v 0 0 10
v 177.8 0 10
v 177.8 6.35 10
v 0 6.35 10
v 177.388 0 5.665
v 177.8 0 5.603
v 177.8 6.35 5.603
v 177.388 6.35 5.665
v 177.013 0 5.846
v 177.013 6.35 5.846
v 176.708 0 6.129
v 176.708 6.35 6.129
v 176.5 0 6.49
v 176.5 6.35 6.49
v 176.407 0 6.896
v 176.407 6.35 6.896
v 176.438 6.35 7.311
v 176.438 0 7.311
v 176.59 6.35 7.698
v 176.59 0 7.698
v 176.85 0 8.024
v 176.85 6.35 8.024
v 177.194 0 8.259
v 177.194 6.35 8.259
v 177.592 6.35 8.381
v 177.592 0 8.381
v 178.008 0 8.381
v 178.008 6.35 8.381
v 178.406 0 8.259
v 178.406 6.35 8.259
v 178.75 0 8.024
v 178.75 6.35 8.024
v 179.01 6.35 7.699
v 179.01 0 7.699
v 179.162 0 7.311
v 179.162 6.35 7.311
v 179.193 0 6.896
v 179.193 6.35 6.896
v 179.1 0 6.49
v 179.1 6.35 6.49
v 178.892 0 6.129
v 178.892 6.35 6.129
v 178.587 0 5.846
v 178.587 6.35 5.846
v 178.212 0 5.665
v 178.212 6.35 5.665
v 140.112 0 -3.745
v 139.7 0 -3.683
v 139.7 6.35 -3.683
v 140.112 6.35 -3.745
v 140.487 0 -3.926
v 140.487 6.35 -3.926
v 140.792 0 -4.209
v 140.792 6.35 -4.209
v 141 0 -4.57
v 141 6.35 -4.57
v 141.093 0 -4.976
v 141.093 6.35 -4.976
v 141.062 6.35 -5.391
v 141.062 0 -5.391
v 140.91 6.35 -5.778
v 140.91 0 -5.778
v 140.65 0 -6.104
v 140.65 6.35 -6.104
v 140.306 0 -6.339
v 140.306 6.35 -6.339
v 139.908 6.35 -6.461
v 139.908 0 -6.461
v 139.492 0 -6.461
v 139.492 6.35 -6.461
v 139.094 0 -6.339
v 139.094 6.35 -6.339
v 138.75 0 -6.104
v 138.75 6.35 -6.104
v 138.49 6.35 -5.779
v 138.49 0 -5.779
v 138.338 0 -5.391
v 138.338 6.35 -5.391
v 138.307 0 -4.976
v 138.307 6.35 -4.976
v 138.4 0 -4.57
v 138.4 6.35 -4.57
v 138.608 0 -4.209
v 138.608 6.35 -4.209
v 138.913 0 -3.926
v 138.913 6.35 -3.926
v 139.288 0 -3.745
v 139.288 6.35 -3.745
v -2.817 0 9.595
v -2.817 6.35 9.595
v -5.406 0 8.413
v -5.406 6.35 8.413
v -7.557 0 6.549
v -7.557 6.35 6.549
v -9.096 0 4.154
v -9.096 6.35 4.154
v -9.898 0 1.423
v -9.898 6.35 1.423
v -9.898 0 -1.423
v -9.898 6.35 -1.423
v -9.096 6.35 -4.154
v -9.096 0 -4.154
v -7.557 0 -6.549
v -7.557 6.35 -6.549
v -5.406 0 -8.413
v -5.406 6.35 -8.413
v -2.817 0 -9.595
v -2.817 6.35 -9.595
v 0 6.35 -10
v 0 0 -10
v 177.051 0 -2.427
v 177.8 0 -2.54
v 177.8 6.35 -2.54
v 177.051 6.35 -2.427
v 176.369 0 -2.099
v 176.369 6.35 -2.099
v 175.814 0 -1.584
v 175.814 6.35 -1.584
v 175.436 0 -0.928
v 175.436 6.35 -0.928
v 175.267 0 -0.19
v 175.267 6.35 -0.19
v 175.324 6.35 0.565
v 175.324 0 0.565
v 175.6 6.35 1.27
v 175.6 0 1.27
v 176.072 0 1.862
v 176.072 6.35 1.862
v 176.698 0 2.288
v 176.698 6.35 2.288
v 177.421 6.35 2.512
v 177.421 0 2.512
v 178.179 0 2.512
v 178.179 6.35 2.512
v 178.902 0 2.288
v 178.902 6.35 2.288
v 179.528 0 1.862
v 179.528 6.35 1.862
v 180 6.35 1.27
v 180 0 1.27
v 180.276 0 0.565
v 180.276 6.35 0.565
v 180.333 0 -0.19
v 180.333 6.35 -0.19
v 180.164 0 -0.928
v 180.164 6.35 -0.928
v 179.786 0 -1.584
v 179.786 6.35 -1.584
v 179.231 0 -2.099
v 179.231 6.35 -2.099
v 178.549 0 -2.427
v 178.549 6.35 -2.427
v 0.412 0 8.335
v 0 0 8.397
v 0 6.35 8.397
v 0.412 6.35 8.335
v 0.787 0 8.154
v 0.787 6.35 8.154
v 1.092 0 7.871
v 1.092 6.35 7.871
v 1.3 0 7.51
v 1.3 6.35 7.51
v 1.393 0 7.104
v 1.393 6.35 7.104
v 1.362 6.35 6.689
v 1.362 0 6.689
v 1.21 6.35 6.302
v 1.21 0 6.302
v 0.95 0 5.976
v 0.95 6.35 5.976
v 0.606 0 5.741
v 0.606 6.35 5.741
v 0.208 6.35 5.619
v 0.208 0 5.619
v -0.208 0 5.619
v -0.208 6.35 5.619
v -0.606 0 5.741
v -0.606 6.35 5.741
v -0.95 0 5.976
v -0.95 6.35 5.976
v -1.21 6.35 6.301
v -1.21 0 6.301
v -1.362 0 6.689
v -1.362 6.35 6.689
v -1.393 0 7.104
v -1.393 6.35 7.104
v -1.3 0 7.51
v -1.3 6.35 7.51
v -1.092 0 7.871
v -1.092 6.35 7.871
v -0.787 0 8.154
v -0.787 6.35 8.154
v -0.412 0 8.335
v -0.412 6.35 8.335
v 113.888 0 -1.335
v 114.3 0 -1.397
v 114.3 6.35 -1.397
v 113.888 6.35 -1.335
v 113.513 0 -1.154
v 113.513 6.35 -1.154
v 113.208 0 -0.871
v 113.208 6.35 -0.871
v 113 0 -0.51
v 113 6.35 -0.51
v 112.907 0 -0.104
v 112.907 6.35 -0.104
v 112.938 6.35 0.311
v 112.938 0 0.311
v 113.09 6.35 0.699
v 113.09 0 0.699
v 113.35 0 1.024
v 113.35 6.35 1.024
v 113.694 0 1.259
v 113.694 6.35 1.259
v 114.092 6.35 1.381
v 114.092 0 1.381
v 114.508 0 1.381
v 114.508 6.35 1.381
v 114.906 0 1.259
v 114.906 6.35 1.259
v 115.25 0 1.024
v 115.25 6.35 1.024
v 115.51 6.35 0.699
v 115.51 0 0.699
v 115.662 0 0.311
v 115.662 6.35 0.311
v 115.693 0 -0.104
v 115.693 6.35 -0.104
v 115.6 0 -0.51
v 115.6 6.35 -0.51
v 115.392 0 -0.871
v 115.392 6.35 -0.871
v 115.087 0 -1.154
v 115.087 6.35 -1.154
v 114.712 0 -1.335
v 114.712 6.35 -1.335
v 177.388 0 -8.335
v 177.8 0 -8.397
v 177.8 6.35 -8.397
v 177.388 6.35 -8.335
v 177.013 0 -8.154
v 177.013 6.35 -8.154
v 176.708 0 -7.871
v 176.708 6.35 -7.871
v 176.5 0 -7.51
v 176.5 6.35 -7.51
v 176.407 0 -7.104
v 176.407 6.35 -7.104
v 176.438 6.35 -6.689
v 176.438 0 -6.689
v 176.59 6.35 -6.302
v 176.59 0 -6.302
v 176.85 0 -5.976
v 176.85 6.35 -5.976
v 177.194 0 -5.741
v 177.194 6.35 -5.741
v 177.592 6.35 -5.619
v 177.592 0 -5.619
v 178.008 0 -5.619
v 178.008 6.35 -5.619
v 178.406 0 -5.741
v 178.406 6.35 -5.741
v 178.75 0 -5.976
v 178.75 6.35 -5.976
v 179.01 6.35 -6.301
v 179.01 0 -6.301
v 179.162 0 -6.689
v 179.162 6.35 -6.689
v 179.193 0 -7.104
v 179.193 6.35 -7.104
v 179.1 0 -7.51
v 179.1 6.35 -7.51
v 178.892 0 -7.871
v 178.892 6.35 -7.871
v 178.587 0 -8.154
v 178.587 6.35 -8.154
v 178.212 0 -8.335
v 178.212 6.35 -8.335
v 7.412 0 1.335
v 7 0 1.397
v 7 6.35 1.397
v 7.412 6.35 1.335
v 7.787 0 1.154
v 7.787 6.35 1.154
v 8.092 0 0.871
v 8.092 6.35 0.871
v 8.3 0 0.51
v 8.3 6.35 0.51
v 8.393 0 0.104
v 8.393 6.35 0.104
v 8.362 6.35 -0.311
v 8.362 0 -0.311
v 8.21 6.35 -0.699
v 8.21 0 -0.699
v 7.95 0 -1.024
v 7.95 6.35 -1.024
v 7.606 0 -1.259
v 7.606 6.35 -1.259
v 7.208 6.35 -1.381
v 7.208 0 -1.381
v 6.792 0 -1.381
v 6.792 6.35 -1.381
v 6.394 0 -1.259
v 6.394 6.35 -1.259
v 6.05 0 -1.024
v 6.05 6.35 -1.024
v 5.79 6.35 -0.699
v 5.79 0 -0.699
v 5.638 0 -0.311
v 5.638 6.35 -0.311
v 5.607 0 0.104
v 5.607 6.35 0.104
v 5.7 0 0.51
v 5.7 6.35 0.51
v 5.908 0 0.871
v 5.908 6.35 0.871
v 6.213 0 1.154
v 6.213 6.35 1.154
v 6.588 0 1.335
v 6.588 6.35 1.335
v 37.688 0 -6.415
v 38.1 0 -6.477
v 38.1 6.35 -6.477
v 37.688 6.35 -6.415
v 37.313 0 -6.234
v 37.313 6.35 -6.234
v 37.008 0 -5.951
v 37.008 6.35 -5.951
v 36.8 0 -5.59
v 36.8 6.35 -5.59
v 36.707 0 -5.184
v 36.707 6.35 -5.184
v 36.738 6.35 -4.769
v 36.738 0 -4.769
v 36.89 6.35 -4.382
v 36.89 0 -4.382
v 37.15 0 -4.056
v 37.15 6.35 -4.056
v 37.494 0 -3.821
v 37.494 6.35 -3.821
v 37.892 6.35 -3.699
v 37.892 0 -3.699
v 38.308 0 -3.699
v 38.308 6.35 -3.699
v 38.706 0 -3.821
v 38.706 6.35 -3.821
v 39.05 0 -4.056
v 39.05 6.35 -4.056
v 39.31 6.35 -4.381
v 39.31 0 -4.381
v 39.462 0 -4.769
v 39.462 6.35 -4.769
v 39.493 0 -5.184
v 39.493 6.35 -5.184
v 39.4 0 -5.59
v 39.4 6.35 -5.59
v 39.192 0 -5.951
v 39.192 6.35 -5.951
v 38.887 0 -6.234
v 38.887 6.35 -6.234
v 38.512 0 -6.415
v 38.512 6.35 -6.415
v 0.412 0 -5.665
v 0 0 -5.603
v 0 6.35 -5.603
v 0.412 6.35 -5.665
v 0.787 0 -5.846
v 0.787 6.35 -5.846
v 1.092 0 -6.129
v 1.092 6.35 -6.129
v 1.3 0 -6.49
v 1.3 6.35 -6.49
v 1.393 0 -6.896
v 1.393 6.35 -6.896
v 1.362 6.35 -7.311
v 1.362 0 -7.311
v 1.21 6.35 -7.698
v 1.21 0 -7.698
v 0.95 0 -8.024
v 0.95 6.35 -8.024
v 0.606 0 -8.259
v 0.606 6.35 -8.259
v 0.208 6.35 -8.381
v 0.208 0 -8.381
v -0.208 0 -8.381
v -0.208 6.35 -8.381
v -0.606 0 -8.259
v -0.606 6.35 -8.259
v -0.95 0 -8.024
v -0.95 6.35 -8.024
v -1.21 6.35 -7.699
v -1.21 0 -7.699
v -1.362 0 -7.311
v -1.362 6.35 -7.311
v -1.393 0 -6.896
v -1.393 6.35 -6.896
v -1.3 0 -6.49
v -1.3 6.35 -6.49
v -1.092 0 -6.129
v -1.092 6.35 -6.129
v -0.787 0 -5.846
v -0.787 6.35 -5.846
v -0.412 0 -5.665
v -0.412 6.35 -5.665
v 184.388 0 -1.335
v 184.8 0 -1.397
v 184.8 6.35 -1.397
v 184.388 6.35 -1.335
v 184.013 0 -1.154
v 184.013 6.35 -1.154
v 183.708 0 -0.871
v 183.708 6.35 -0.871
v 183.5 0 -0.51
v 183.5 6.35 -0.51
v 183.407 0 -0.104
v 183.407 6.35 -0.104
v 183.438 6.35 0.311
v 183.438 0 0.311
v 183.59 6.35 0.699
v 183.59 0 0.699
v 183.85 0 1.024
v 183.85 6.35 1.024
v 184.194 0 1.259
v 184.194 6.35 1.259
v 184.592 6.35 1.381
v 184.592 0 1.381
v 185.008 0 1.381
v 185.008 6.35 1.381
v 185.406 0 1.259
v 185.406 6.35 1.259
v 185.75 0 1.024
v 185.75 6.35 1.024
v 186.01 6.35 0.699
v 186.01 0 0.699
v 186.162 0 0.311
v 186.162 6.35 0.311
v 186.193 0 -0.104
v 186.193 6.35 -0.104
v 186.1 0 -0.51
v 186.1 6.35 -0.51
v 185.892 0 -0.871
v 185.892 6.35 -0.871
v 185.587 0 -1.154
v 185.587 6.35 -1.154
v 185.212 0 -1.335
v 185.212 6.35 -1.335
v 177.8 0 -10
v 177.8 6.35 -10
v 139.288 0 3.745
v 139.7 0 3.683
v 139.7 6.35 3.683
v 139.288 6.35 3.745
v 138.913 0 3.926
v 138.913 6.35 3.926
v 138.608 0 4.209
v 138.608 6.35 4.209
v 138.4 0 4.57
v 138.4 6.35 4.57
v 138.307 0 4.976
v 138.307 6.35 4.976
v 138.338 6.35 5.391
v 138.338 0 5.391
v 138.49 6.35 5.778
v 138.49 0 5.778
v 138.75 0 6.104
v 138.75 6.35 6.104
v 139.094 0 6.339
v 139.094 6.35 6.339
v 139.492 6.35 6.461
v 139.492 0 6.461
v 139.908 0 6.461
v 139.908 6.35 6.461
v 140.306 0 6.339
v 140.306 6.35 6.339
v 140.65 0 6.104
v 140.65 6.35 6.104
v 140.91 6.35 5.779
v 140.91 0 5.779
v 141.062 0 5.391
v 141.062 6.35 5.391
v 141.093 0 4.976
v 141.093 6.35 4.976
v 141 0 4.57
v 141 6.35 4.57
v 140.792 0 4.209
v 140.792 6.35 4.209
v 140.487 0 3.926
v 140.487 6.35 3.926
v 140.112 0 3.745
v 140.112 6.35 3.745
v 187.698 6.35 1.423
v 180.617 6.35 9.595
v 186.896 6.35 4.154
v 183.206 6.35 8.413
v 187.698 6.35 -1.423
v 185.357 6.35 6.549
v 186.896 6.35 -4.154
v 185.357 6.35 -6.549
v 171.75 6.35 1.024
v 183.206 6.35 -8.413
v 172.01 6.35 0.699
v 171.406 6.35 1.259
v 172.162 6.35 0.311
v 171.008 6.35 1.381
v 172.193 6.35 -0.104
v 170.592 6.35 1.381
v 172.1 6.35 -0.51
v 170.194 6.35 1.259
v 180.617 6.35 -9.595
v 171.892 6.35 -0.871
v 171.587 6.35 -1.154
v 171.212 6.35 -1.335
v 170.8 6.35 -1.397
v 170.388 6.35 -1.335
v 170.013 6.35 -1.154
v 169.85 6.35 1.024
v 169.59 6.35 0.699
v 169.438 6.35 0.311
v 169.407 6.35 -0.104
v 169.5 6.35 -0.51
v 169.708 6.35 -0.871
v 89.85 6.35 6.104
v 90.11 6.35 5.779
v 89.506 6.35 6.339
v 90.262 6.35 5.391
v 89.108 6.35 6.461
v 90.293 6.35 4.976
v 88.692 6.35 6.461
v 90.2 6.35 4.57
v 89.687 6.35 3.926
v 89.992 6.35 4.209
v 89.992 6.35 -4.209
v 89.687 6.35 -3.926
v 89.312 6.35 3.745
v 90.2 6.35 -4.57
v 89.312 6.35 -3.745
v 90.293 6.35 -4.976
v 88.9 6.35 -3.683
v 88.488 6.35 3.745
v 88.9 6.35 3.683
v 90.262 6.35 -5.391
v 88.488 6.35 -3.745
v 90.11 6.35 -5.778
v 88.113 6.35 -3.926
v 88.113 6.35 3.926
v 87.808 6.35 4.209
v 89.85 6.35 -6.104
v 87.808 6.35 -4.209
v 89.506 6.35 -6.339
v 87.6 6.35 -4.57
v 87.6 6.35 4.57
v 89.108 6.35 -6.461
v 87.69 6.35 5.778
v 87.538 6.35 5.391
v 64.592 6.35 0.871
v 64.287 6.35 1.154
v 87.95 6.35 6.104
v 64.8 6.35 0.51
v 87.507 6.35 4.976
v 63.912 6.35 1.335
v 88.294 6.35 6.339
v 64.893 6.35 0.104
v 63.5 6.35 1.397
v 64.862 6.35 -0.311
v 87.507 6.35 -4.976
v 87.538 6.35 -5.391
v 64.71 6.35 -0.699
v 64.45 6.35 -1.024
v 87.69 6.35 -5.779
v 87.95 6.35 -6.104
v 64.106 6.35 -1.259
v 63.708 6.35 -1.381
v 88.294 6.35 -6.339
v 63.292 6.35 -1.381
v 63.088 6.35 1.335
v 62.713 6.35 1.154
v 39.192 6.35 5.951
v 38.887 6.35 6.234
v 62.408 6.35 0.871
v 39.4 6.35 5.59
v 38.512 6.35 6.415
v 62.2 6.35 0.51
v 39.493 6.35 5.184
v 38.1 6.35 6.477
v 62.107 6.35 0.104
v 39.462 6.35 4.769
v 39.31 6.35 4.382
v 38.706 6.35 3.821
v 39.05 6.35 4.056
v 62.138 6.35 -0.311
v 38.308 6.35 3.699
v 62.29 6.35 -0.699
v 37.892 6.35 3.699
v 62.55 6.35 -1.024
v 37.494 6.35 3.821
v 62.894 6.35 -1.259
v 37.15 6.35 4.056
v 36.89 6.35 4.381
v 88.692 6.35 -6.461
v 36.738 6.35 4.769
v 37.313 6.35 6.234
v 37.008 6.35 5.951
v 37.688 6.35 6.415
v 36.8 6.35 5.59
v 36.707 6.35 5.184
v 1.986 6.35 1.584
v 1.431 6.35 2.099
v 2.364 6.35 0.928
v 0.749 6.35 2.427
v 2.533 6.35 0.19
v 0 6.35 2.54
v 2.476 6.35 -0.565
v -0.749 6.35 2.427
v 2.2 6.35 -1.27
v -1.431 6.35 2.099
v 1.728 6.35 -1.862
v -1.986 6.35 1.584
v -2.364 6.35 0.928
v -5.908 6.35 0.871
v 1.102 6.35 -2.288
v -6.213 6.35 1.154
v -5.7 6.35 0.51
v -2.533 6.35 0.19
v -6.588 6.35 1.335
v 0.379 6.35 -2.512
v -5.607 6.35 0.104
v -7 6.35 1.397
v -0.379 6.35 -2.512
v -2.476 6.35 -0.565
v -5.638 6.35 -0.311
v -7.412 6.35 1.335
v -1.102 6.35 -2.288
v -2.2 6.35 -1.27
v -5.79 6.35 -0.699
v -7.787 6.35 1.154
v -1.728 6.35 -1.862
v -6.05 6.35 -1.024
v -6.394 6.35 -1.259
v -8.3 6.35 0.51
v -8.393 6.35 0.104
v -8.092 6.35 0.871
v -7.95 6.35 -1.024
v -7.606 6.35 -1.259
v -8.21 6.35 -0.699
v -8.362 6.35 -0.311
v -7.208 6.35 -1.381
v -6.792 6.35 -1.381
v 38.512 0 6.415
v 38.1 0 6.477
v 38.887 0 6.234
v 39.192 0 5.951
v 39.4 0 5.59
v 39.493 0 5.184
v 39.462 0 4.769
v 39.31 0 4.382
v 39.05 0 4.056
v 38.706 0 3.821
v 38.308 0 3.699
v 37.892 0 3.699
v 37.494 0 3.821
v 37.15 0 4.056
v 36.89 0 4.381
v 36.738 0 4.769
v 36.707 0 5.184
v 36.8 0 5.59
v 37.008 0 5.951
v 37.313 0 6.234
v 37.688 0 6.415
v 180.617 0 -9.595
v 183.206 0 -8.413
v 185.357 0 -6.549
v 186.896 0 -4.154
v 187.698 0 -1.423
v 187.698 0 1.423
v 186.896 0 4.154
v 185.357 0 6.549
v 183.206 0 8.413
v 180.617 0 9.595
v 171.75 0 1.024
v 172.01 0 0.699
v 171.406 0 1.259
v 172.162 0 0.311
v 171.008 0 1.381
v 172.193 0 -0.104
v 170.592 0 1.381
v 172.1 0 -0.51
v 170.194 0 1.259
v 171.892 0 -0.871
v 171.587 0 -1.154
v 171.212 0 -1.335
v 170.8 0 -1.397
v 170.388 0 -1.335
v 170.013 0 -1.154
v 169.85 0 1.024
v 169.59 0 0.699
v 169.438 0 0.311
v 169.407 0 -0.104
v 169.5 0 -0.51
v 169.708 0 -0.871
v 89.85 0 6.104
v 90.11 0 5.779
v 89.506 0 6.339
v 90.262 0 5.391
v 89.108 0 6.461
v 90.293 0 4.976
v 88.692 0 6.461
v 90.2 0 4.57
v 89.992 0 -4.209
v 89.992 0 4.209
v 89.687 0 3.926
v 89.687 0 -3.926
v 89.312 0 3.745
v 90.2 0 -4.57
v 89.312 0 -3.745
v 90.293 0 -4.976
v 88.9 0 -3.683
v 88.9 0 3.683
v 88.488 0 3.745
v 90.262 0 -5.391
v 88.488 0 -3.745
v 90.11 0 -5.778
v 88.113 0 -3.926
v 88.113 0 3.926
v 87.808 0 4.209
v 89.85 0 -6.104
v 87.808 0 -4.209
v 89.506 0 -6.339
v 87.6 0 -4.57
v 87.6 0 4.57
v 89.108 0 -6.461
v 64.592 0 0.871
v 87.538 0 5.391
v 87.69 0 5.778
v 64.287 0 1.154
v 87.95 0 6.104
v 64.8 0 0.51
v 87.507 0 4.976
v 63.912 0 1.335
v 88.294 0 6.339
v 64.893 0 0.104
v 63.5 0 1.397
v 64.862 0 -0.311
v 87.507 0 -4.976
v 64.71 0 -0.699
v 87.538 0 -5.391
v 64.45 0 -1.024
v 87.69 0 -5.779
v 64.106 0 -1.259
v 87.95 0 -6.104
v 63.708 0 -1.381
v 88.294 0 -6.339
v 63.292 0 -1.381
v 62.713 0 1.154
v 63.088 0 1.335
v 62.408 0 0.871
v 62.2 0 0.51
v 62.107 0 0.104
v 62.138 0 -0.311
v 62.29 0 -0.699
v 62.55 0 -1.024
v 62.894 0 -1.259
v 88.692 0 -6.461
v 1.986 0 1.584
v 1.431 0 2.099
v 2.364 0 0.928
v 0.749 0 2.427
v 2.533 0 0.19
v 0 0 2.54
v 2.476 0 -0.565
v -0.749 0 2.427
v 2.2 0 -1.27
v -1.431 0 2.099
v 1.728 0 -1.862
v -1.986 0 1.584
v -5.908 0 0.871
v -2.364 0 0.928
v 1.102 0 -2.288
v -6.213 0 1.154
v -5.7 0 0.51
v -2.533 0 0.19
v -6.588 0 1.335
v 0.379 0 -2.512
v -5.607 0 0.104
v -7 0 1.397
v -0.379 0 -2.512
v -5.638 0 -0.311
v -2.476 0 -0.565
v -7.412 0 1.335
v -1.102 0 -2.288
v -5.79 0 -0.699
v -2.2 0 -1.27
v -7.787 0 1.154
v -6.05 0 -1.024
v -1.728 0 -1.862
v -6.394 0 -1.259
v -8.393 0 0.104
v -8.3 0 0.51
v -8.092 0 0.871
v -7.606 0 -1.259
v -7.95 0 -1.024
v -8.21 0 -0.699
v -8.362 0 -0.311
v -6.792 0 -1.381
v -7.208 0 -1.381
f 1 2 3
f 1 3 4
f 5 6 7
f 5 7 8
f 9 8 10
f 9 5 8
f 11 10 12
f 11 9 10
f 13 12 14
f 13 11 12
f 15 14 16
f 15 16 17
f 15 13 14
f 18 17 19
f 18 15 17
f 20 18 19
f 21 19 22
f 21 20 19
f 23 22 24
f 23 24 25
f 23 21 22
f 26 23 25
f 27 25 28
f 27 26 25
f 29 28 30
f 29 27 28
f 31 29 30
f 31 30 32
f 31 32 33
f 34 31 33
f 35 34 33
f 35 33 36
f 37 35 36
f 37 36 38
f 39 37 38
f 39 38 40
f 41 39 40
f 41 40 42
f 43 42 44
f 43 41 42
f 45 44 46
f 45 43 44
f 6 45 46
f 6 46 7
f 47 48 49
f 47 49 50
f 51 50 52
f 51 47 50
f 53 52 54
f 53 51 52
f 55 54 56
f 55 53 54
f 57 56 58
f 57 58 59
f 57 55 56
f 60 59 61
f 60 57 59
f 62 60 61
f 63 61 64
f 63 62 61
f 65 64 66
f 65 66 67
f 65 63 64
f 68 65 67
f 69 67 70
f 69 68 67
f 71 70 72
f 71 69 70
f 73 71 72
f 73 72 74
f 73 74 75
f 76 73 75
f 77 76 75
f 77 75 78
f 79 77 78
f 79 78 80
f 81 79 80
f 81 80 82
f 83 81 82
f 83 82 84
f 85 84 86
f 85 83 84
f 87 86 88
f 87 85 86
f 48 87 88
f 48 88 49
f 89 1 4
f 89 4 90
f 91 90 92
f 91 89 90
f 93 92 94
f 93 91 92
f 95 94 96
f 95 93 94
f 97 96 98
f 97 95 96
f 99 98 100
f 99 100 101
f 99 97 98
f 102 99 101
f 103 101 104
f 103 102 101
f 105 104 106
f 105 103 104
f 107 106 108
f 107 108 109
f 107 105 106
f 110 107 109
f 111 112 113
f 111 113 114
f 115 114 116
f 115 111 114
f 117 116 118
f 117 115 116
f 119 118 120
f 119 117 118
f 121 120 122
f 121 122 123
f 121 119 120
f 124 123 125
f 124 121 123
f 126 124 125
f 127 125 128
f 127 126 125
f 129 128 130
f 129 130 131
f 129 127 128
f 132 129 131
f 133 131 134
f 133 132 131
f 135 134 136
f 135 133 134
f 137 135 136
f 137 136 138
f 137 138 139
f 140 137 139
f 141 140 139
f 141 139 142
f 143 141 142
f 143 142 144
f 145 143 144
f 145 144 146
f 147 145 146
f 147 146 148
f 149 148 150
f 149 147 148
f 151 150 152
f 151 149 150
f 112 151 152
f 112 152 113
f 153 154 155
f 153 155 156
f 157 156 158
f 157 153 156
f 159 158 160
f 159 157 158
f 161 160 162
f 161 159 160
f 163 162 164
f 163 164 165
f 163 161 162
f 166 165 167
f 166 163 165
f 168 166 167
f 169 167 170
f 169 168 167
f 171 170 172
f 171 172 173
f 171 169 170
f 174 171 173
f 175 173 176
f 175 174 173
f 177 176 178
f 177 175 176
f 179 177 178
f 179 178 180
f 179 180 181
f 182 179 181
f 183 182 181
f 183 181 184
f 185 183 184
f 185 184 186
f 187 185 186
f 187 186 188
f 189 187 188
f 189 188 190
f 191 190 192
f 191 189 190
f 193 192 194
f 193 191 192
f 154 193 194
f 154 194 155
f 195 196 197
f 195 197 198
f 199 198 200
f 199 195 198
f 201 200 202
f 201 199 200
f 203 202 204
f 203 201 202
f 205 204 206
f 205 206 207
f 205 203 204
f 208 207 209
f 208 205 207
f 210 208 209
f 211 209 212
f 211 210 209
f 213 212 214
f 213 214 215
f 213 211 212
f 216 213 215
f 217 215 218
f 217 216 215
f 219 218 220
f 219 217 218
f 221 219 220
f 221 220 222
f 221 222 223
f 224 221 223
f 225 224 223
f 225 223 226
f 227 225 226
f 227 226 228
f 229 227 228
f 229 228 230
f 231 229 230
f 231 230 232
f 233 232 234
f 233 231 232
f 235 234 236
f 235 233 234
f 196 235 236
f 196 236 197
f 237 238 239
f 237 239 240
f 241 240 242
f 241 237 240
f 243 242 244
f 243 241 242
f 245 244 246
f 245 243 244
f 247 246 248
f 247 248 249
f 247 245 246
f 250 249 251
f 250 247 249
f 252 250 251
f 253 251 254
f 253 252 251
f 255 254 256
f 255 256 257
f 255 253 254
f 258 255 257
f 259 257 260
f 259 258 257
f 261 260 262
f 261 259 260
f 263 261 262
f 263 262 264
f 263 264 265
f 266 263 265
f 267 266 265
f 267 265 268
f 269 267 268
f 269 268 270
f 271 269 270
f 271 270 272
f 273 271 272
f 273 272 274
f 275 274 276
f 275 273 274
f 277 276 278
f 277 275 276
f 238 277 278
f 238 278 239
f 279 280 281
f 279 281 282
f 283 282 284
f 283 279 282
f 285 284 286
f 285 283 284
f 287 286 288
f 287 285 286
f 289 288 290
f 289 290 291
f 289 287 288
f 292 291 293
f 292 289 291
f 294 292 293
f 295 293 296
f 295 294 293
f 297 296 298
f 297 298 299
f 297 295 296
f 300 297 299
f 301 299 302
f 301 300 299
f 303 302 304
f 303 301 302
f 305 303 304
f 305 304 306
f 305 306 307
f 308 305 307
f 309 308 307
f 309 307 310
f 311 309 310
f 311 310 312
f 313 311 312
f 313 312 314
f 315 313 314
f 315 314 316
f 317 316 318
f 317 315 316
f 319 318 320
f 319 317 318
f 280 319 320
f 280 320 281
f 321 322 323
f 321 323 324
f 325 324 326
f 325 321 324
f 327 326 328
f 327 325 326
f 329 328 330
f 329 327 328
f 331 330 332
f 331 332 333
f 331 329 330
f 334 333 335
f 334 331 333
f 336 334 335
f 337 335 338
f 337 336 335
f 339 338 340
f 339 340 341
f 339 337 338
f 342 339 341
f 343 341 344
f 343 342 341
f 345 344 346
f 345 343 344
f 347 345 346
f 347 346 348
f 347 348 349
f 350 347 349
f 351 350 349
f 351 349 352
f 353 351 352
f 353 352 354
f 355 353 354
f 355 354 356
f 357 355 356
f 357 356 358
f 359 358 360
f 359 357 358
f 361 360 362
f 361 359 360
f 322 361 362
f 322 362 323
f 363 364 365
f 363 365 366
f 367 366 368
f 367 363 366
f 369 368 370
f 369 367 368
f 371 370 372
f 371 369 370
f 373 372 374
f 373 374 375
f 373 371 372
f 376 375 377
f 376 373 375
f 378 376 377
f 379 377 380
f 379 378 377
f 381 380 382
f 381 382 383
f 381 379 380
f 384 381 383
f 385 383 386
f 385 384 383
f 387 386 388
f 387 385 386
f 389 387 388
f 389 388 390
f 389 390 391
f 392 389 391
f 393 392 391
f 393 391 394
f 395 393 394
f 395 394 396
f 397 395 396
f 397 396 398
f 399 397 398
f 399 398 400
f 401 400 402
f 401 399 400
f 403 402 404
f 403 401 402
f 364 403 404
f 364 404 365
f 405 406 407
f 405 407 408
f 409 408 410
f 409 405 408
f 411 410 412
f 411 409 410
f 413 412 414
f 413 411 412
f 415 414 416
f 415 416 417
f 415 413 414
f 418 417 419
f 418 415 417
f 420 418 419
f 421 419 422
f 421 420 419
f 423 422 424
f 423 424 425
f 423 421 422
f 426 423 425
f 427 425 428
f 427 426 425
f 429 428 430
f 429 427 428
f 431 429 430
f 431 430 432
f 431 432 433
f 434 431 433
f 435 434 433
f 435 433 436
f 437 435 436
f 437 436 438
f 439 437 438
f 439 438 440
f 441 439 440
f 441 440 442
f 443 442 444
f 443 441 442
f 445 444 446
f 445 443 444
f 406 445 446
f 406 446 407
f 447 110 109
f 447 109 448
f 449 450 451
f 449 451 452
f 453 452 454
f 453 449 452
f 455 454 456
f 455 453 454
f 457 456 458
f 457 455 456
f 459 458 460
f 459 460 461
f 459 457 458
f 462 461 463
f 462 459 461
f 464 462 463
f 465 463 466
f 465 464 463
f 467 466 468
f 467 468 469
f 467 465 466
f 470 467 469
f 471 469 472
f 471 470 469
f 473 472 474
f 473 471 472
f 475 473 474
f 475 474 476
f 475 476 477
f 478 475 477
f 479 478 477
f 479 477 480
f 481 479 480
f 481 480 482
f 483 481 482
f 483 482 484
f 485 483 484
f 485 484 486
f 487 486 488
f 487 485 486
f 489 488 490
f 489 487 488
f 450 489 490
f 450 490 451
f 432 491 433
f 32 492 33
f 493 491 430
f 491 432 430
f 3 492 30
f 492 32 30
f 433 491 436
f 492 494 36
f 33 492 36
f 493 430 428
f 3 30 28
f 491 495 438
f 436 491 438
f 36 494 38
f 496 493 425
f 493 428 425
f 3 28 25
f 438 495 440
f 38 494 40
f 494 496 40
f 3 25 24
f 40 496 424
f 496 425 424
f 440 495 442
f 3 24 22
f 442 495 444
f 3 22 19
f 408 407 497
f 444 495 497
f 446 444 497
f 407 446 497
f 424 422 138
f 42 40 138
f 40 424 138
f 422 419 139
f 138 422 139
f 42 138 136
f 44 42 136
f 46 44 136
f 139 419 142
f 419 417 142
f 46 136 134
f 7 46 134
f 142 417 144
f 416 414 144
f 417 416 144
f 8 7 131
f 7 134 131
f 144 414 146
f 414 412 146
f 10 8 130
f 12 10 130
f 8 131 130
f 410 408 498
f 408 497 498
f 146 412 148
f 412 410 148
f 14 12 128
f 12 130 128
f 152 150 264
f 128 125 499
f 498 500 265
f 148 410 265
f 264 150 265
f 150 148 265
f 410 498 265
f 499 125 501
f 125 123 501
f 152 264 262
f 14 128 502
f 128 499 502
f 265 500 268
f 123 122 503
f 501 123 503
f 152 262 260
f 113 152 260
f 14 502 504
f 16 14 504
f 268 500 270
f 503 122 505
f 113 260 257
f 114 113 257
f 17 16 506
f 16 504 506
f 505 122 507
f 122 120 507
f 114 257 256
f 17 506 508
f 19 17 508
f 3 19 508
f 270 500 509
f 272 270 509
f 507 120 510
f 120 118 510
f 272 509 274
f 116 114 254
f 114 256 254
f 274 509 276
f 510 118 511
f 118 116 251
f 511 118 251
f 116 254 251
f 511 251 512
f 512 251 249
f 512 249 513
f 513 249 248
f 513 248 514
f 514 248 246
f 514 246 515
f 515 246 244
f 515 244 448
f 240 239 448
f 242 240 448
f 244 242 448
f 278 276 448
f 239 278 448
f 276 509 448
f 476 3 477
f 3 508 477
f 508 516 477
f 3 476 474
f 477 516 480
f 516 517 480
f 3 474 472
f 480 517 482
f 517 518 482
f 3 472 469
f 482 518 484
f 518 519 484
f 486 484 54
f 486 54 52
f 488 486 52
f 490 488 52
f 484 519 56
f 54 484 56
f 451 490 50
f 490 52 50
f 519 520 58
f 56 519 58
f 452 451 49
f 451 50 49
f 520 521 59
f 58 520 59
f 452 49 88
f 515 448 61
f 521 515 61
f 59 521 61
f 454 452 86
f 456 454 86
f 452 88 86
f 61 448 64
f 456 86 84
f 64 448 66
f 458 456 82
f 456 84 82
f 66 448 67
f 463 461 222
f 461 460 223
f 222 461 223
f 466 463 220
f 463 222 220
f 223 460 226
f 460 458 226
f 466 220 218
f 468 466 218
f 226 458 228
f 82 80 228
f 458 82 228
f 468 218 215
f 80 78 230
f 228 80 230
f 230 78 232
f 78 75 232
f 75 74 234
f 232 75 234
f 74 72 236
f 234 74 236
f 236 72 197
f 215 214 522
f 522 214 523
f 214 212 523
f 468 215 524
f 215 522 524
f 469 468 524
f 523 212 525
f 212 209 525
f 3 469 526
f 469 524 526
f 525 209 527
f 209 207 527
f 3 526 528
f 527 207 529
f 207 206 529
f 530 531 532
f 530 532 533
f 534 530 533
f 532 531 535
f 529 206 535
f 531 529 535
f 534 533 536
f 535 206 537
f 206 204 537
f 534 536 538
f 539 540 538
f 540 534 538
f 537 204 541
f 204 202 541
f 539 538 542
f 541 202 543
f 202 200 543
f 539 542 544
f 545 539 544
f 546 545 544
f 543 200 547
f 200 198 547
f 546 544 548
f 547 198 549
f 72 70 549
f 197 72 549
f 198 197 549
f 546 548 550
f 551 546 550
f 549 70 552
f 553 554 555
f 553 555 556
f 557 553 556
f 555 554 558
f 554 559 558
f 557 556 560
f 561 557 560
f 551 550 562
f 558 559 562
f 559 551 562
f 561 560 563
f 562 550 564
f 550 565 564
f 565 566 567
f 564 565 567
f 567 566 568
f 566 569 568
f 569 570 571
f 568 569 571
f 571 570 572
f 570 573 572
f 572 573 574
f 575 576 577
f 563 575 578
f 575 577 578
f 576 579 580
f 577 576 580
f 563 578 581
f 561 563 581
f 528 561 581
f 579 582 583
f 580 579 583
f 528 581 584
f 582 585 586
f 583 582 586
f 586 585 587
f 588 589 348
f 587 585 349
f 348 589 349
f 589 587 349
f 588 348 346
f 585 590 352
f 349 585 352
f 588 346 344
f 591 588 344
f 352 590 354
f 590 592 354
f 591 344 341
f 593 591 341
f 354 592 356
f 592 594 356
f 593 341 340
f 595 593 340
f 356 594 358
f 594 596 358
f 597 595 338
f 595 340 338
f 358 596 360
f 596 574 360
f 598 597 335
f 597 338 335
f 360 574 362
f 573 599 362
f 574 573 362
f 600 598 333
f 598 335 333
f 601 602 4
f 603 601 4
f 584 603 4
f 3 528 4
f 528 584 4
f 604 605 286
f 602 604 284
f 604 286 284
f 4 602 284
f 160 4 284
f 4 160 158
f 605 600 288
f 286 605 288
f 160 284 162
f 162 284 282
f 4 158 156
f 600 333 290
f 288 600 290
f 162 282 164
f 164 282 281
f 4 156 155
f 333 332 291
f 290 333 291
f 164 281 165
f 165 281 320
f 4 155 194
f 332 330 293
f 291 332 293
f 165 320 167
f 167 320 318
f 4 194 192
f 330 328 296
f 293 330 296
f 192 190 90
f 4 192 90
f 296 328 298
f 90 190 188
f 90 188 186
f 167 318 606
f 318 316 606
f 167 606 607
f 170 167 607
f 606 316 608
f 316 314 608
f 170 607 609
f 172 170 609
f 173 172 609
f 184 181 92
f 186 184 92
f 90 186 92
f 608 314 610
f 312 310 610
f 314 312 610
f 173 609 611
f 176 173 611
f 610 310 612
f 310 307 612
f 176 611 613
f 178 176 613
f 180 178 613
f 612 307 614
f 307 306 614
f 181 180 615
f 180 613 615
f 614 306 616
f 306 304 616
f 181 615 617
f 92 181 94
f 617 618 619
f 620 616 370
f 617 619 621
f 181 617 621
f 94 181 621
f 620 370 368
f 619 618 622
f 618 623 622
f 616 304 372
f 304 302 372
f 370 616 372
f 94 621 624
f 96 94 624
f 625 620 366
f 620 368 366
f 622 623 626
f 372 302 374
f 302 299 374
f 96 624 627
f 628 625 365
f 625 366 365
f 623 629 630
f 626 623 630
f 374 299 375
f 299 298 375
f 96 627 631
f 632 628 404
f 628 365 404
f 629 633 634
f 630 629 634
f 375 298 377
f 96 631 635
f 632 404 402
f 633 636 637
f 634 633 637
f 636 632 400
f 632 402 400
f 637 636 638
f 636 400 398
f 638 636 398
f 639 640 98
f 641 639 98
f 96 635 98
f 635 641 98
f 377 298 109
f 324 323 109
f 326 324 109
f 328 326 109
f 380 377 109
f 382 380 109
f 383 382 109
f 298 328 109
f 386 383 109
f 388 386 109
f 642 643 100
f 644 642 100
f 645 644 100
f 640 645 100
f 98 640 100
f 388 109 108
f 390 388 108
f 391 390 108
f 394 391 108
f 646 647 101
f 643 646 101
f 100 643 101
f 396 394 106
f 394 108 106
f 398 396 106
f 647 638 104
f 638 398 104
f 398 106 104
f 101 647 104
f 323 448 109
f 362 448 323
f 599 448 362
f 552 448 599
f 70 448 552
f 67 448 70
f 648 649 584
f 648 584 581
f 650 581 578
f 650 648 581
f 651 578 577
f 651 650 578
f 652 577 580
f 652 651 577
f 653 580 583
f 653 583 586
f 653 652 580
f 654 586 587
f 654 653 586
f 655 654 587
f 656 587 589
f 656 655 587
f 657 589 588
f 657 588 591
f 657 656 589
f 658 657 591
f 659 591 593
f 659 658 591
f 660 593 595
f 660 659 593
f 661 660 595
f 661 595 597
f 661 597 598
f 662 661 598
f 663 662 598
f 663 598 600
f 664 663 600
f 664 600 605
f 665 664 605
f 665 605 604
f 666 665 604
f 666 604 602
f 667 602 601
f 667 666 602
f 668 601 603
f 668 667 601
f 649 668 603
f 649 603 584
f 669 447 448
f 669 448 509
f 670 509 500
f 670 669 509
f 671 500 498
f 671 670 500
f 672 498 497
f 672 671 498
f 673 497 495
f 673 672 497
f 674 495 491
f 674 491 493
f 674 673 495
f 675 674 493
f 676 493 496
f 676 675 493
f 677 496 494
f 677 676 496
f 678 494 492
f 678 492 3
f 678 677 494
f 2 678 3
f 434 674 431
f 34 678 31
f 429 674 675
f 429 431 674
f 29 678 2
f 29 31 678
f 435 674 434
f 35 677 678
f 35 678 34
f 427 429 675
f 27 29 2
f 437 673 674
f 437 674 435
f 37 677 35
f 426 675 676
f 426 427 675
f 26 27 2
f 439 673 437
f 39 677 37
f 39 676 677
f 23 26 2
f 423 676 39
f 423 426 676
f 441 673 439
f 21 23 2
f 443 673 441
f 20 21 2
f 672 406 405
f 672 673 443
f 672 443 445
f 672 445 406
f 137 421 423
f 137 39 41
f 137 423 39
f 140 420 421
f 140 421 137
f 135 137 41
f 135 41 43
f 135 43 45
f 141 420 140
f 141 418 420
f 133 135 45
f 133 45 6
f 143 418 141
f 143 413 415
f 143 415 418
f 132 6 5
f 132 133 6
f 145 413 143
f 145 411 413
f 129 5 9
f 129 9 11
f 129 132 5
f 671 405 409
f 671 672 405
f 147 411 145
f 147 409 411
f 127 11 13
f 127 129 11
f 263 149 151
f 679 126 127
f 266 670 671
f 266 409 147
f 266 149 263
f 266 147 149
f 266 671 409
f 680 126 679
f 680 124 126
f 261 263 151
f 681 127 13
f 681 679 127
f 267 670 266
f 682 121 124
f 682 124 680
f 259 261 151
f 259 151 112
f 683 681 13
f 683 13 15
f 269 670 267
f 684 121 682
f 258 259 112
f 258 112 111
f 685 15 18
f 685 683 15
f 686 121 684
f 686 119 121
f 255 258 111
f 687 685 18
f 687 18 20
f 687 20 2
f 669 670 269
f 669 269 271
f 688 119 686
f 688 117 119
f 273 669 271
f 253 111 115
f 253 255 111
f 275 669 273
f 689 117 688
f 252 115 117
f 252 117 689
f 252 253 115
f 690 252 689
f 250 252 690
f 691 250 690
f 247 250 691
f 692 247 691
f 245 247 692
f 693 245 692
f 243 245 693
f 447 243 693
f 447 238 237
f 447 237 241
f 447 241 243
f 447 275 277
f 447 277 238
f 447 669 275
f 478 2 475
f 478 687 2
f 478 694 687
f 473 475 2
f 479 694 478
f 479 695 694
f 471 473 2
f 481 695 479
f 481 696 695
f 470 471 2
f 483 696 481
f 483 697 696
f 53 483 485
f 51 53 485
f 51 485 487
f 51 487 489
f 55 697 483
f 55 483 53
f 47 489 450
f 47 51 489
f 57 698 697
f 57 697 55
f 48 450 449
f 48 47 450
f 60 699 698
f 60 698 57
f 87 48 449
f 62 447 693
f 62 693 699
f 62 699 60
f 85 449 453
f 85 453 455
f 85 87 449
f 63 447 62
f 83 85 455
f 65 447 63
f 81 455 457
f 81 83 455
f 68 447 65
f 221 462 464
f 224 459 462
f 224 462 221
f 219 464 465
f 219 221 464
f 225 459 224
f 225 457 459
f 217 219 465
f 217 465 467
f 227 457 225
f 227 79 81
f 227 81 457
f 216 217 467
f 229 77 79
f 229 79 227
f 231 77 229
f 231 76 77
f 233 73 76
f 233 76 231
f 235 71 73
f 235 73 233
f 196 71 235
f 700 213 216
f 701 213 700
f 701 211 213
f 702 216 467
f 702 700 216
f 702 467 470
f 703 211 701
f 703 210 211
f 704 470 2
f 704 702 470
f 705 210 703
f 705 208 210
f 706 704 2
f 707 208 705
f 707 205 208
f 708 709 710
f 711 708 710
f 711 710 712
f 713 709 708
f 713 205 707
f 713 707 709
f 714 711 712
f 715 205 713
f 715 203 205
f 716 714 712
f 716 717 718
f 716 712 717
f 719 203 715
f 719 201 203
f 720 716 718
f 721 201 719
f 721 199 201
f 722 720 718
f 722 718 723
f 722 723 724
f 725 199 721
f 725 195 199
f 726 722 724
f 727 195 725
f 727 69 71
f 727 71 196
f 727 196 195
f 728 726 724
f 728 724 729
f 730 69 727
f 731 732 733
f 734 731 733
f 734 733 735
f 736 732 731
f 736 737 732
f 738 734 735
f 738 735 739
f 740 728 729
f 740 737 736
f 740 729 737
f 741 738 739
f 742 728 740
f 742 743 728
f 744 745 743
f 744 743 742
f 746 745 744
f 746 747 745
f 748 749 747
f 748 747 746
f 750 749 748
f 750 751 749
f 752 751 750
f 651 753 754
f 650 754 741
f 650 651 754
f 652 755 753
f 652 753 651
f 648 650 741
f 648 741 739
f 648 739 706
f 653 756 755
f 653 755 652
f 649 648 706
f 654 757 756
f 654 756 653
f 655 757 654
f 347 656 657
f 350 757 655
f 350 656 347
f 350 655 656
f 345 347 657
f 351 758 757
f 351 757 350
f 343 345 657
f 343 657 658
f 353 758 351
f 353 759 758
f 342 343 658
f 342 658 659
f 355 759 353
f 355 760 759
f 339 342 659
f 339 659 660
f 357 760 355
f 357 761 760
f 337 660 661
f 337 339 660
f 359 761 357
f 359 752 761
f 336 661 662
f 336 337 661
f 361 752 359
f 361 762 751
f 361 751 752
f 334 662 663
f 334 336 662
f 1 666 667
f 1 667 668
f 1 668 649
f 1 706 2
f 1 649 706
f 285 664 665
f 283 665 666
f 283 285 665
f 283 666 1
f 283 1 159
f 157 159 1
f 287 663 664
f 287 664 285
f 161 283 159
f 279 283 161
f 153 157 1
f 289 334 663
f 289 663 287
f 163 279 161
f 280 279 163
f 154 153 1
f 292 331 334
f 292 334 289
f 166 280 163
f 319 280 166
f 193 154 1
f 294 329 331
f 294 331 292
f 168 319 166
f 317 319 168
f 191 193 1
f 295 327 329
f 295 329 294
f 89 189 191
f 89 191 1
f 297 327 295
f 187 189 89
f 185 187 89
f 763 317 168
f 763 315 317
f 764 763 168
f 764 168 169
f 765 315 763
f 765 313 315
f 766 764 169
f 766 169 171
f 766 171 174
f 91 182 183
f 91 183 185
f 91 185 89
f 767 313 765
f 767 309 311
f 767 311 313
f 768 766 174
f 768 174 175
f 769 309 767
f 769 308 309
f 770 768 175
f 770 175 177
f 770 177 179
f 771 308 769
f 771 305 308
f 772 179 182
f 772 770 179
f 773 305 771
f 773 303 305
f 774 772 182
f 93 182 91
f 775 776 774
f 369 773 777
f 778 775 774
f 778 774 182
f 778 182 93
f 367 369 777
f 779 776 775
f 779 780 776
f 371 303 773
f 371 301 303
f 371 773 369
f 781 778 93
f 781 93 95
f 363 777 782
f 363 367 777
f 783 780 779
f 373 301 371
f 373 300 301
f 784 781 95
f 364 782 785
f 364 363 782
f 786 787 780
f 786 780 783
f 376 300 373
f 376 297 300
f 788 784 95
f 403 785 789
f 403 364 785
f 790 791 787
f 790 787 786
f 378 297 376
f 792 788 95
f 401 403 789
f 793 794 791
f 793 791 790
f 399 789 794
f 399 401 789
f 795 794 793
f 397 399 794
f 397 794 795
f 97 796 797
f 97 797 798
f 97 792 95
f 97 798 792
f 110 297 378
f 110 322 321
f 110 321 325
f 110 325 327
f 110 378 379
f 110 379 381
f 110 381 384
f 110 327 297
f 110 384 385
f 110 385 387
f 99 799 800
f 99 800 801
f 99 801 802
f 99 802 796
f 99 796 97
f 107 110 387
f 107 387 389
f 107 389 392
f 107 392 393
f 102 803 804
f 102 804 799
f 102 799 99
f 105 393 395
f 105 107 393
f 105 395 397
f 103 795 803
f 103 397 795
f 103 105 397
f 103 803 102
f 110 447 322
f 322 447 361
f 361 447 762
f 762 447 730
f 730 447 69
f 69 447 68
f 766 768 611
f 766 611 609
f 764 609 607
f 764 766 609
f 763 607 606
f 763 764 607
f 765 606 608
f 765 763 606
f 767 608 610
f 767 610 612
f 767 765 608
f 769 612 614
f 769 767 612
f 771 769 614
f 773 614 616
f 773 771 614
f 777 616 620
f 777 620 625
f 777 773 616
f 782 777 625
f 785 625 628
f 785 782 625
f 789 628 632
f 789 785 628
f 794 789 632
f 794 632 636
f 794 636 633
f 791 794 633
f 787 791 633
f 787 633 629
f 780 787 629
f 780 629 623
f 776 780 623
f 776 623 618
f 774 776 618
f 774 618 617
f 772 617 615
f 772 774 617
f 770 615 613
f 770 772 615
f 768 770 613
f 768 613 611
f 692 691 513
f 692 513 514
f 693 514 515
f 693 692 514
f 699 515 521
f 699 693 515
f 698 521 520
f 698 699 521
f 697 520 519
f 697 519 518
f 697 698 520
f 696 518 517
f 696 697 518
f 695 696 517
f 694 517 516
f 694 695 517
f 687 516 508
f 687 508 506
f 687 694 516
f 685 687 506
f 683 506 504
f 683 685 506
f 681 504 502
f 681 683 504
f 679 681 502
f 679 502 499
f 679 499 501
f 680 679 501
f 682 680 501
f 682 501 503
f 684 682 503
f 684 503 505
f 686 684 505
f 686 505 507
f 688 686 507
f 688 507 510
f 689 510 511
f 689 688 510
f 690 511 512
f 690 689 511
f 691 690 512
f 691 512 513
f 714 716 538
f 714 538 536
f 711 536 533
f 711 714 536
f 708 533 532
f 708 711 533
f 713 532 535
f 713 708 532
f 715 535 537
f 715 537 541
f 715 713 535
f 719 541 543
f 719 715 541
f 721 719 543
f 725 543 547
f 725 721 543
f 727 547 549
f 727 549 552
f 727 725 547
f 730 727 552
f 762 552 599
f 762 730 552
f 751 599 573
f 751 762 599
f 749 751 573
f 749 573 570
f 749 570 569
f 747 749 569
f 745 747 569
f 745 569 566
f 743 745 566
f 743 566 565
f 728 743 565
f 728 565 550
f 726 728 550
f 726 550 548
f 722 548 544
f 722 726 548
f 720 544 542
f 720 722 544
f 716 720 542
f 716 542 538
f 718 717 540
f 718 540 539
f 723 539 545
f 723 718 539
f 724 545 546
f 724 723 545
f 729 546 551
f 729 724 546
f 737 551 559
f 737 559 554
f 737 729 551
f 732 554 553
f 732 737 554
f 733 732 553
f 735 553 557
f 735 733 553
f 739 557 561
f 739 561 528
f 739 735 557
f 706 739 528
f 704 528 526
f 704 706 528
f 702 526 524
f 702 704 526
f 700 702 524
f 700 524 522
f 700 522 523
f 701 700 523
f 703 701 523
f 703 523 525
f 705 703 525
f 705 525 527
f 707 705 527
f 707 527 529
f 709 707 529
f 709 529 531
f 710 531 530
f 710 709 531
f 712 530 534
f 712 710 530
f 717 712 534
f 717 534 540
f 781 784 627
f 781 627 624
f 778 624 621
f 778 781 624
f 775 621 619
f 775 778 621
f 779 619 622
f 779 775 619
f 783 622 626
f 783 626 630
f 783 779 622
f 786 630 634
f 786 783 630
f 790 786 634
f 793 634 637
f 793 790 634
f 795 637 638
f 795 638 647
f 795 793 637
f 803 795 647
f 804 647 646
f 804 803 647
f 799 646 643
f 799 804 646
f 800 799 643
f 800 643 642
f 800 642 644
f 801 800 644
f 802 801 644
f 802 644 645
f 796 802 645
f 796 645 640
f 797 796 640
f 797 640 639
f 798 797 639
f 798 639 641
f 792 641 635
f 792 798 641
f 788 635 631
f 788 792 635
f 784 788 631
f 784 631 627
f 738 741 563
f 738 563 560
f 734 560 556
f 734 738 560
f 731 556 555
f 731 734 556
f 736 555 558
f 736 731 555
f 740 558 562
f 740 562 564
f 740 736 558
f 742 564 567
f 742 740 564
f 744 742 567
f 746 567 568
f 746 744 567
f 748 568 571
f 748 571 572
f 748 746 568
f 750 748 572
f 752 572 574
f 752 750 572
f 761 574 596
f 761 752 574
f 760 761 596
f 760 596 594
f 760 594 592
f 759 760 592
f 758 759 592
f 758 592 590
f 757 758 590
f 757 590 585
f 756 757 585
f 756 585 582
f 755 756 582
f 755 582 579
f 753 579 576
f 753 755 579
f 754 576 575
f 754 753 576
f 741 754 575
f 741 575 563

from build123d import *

# Parameters (mm, degrees)
SKETCH1_R           = 1.397
SKETCH1_R_2         = 2.54
BOSS_EXTRUDE1_DEPTH = 6.35


with BuildPart() as part:
    # Sketch1 → Boss-Extrude1 (new body)
    with BuildSketch(Plane(origin=(0, 0, 0), x_dir=(1, 0, 0), z_dir=(0, 1, 0))):
        with BuildLine():
            Line((0, 10), (177.8, 10))
            ThreePointArc((177.8, 10), (187.8, 0), (177.8, -10))
            Line((177.8, -10), (0, -10))
            ThreePointArc((0, -10), (-10, 0), (0, 10))
        make_face()
        with Locations(Location((-7, 0, 0), (0, 0, 270))):
            Circle(SKETCH1_R, mode=Mode.SUBTRACT)
        with Locations(Location((0, 0, 0), (0, 0, 270))):
            Circle(SKETCH1_R_2, mode=Mode.SUBTRACT)
        with Locations(Location((0, 7, 0), (0, 0, 270))):
            Circle(SKETCH1_R, mode=Mode.SUBTRACT)
        with Locations(Location((7, 0, 0), (0, 0, 270))):
            Circle(SKETCH1_R, mode=Mode.SUBTRACT)
        with Locations(Location((0, -7, 0), (0, 0, 270))):
            Circle(SKETCH1_R, mode=Mode.SUBTRACT)
        with Locations(Location((177.8, 7, 0), (0, 0, 90))):
            Circle(SKETCH1_R, mode=Mode.SUBTRACT)
        with Locations(Location((184.8, 0, 0), (0, 0, 90))):
            Circle(SKETCH1_R, mode=Mode.SUBTRACT)
        with Locations(Location((177.8, -7, 0), (0, 0, 90))):
            Circle(SKETCH1_R, mode=Mode.SUBTRACT)
        with Locations(Location((177.8, 0, 0), (0, 0, 90))):
            Circle(SKETCH1_R_2, mode=Mode.SUBTRACT)
        with Locations(Location((170.8, 0, 0), (0, 0, 90))):
            Circle(SKETCH1_R, mode=Mode.SUBTRACT)
        with Locations(Location((88.9, 5.08, 0), (0, 0, 270))):
            Circle(SKETCH1_R, mode=Mode.SUBTRACT)
        with Locations(Location((88.9, -5.08, 0), (0, 0, 90))):
            Circle(SKETCH1_R, mode=Mode.SUBTRACT)
        with Locations(Location((63.5, 0, 0), (0, 0, 270))):
            Circle(SKETCH1_R, mode=Mode.SUBTRACT)
        with Locations(Location((38.1, 5.08, 0), (0, 0, 90))):
            Circle(SKETCH1_R, mode=Mode.SUBTRACT)
        with Locations(Location((38.1, -5.08, 0), (0, 0, 270))):
            Circle(SKETCH1_R, mode=Mode.SUBTRACT)
        with Locations(Location((114.3, 0, 0), (0, 0, 90))):
            Circle(SKETCH1_R, mode=Mode.SUBTRACT)
        with Locations(Location((139.7, 5.08, 0), (0, 0, 270))):
            Circle(SKETCH1_R, mode=Mode.SUBTRACT)
        with Locations(Location((139.7, -5.08, 0), (0, 0, 90))):
            Circle(SKETCH1_R, mode=Mode.SUBTRACT)
    extrude(amount=BOSS_EXTRUDE1_DEPTH)


solid = part.part
